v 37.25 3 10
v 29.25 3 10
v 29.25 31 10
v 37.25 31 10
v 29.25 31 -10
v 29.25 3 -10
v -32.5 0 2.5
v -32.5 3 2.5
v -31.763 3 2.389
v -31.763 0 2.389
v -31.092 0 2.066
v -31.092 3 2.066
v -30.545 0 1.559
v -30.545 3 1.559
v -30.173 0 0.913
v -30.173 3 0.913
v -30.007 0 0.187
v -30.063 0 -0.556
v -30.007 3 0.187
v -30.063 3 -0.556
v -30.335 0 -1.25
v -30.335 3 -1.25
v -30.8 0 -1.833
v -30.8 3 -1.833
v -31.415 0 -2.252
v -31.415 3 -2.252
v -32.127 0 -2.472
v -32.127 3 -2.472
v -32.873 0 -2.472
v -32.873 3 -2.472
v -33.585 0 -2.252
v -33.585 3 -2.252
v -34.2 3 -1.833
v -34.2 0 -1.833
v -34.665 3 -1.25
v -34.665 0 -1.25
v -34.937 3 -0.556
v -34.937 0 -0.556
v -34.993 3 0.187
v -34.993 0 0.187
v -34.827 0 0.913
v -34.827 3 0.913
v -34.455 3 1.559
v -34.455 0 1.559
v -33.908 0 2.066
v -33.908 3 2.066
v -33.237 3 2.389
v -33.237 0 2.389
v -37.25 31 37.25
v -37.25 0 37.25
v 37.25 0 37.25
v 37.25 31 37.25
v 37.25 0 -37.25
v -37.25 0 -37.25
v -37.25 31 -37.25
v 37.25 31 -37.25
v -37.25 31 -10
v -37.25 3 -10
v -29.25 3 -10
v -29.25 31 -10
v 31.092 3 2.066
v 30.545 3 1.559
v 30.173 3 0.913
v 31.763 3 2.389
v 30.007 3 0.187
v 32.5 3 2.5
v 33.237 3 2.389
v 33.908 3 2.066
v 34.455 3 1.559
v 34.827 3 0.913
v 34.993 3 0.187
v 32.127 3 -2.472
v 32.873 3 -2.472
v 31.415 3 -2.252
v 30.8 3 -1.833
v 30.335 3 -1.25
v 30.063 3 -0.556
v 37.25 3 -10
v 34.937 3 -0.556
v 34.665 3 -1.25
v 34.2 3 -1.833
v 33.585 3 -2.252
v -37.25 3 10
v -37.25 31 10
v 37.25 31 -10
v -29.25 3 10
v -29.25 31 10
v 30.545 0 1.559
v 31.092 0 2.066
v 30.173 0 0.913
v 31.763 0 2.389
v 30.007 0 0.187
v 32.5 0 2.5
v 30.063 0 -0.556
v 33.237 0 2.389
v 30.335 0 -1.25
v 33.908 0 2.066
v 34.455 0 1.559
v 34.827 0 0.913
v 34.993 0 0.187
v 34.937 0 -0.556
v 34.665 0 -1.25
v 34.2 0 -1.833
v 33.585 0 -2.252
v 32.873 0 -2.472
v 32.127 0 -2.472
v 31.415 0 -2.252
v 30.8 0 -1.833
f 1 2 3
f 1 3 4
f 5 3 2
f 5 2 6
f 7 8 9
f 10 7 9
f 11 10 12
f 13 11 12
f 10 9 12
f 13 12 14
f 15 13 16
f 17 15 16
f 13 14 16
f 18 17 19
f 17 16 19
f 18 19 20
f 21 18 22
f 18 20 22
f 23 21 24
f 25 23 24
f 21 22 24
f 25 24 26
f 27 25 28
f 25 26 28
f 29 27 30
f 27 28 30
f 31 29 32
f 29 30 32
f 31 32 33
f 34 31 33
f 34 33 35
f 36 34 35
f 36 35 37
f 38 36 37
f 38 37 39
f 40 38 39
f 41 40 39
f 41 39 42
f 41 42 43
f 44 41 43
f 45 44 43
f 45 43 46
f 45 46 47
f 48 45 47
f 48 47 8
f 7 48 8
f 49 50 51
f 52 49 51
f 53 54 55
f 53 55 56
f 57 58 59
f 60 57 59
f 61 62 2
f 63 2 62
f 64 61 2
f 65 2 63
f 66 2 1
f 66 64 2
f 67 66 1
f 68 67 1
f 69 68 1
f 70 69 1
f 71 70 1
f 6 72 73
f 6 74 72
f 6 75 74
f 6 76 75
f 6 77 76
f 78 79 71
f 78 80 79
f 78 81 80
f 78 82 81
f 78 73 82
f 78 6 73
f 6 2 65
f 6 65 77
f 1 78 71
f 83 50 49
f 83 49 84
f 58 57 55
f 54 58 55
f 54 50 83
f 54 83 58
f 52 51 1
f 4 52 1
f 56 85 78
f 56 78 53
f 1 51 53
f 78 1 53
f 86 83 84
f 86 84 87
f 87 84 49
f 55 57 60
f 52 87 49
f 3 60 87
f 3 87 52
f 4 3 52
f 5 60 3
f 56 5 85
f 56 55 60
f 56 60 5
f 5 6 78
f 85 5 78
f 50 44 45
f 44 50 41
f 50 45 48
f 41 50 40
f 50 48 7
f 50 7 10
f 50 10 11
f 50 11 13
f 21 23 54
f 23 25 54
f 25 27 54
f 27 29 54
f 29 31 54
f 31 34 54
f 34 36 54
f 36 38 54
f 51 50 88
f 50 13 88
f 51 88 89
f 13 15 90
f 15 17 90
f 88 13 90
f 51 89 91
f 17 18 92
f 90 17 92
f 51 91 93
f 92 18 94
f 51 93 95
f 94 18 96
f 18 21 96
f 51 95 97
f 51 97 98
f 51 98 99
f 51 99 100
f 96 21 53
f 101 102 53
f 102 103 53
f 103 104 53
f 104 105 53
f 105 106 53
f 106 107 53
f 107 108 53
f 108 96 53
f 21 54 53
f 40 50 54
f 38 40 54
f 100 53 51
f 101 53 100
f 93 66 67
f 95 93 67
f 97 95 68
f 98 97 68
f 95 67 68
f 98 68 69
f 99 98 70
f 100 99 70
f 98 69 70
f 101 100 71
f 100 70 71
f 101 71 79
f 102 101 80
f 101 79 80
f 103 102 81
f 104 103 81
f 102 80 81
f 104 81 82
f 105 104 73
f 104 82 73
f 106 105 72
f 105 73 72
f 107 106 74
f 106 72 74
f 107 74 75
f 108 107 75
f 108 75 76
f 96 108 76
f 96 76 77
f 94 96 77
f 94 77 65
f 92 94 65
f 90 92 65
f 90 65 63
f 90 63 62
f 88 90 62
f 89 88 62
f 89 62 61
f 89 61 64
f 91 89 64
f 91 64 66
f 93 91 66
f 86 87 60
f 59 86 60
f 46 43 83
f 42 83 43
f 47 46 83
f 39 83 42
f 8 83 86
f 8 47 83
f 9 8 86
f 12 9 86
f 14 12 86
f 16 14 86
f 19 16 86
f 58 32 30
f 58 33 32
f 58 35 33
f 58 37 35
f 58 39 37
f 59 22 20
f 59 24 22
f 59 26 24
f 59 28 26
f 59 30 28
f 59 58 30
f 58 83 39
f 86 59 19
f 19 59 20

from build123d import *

# Parameters (mm, degrees)
SKETCH_1_W          = 74.5
SKETCH_1_H          = 74.5
EXTRUDE_1_DEPTH     = 31
SKETCH_2_W          = 8
SKETCH_2_H          = 20
CUT_EXTRUDE_1_DEPTH = 28
SKETCH_3_R          = 2.5
CUT_EXTRUDE_2_DEPTH = 60.658402593


with BuildPart() as part:
    # 草图1 → 凸台-拉伸1 (new body)
    with BuildSketch(Plane(origin=(0, 0, 0), x_dir=(1, 0, 0), z_dir=(0, 1, 0))):
        Rectangle(SKETCH_1_W, SKETCH_1_H)
    extrude(amount=EXTRUDE_1_DEPTH)

    # 草图2 → 切除-拉伸1 (cut)
    with BuildSketch(Plane(origin=(0, 31, 0), x_dir=(1, 0, 0), z_dir=(0, 1, 0))):
        with Locations((-33.25, 0)):
            Rectangle(SKETCH_2_W, SKETCH_2_H)
        with Locations((33.25, 0)):
            Rectangle(SKETCH_2_W, SKETCH_2_H)
    extrude(amount=-CUT_EXTRUDE_1_DEPTH, mode=Mode.SUBTRACT)

    # 草图3 → 切除-拉伸2 (cut, through all)
    with BuildSketch(Plane(origin=(0, 3, 0), x_dir=(1, 0, 0), z_dir=(0, 1, 0))):
        with Locations(Location((-32.5, 0, 0), (0, 0, 270))):
            Circle(SKETCH_3_R)
        with Locations(Location((32.5, 0, 0), (0, 0, 270))):
            Circle(SKETCH_3_R)
    extrude(amount=-CUT_EXTRUDE_2_DEPTH, mode=Mode.SUBTRACT)


solid = part.part
